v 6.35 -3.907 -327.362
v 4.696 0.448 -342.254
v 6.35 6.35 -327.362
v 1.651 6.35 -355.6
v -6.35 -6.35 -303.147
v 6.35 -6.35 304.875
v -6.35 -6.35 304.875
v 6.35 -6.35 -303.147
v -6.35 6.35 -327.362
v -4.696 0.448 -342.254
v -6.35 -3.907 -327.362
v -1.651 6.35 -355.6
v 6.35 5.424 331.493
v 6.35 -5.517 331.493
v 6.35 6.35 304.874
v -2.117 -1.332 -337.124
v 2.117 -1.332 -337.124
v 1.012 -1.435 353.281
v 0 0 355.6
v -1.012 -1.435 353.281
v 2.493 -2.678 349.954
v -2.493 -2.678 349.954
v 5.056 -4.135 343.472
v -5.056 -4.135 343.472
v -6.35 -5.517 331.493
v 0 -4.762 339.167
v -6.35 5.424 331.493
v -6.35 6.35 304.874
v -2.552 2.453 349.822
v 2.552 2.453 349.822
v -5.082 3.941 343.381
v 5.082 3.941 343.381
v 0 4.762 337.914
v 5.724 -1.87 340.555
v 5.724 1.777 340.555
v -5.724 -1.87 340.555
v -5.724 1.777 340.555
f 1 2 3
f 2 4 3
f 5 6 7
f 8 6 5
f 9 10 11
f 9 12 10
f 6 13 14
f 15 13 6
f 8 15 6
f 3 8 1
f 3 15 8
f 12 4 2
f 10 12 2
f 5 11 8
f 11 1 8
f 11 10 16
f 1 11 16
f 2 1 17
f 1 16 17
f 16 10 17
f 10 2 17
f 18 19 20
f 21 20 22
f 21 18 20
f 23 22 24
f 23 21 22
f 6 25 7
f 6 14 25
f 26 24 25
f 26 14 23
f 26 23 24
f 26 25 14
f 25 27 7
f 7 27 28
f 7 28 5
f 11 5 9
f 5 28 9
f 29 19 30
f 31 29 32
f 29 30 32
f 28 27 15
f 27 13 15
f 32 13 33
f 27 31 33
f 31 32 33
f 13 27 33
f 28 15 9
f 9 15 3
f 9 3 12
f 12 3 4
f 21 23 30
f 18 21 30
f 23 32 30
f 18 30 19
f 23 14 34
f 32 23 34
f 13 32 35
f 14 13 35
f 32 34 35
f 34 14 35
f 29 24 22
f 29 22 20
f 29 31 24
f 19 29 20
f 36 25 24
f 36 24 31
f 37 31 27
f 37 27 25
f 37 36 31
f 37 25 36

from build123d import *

# Parameters (mm, degrees)
SKETCH2_W           = 711.2
SKETCH2_H           = 12.7
BOSS_EXTRUDE2_DEPTH = 6.35
CUT_EXTRUDE1_DEPTH  = 13.7
CUT_EXTRUDE2_DEPTH  = 13.7000001
CUT_EXTRUDE3_DEPTH  = 13.7000001
CUT_EXTRUDE4_DEPTH  = 13.7000001


with BuildPart() as part:
    # Sketch2 → Boss-Extrude2 (new body, symmetric)
    with BuildSketch(Plane(origin=(0, 0, 0), x_dir=(0, 0, -1), z_dir=(1, 0, 0))):
        Rectangle(SKETCH2_W, SKETCH2_H)
    extrude(amount=BOSS_EXTRUDE2_DEPTH, both=True)

    # Sketch4 → Cut-Extrude1 (cut, through all)
    with BuildSketch(Plane(origin=(6.35, 0, 0), x_dir=(0, 0, -1), z_dir=(1, 0, 0))):
        with BuildLine():
            Line((-304.87408605, 6.35), (-304.87408605, 13.865538478))
            Line((-304.87408605, 13.865538478), (-363.512264419, 13.865538478))
            Line((-363.512264419, 13.865538478), (-363.512264419, -12.328277535))
            Line((-363.512264419, -12.328277535), (-304.874567486, -12.328277535))
            Line((-304.874567486, -12.328277535), (-304.874567486, -6.35))
            add(Edge.make_bspline(
                [(-355.6, 0), (-348.097307304, -6.35), (-304.874567486, -6.35)],
                knots=[0, 0, 0, 1, 1, 1], degree=2))
            add(Edge.make_bspline(
                [(-355.6, 0), (-345.591229217, 6.35), (-304.87408605, 6.35)],
                knots=[0, 0, 0, 1, 1, 1], degree=2))
        make_face()
    extrude(amount=-CUT_EXTRUDE1_DEPTH, mode=Mode.SUBTRACT)

    # Sketch5 → Cut-Extrude2 (cut, through all)
    with BuildSketch(Plane(origin=(0, 6.35, 0), x_dir=(1, 0, 0), z_dir=(0, 1, 0))):
        with BuildLine():
            Line((-6.35, -304.87408605), (-23.988893808, -304.87408605))
            Line((-23.988893808, -304.87408605), (-23.988893808, -362.653977565))
            Line((-23.988893808, -362.653977565), (16.903963191, -362.653977565))
            Line((16.903963191, -362.653977565), (16.903963191, -304.87408605))
            Line((16.903963191, -304.87408605), (6.35, -304.87408605))
            add(Edge.make_bspline(
                [(6.35, -304.87408605), (6.35, -345.744640536), (7.326296323, -338.596228196), (0, -355.6)],
                knots=[0, 0, 0, 0, 1, 1, 1, 1], degree=3))
            add(Edge.make_bspline(
                [(-6.35, -304.87408605), (-6.35, -345.744640536), (-7.326296323, -338.596228196), (0, -355.6)],
                knots=[0, 0, 0, 0, 1, 1, 1, 1], degree=3))
        make_face()
    extrude(amount=-CUT_EXTRUDE2_DEPTH, mode=Mode.SUBTRACT)

    # Sketch6 → Cut-Extrude3 (cut, through all)
    with BuildSketch(Plane(origin=(6.35, 0, 0), x_dir=(0, 0, -1), z_dir=(1, 0, 0))):
        with BuildLine():
            Line((286.848717456, -6.35), (286.848717456, -20.474403892))
            Line((286.848717456, -20.474403892), (367.422975775, -20.474403892))
            Line((367.422975775, -20.474403892), (367.422975775, 6.35))
            Line((367.422975775, 6.35), (355.6, 6.35))
            add(Edge.make_bspline(
                [(355.6, 6.35), (329.990285951, -6.563724339), (313.323760361, -6.629041346), (286.848717456, -6.35)],
                knots=[0, 0, 0, 0, 1, 1, 1, 1], degree=3))
        make_face()
    extrude(amount=-CUT_EXTRUDE3_DEPTH, mode=Mode.SUBTRACT)

    # Sketch7 → Cut-Extrude4 (cut, through all)
    with BuildSketch(Plane(origin=(0, 6.35, 0), x_dir=(1, 0, 0), z_dir=(0, 1, 0))):
        with BuildLine():
            Line((1.651, 355.6), (-1.651, 355.6))
            add(Edge.make_bspline(
                [(-1.651, 355.6), (-7.543065091, 333.607768993), (-6.35, 324.690959151), (-6.35, 310.113688271)],
                knots=[0, 0, 0, 0, 1, 1, 1, 1], degree=3))
            Line((-6.35, 310.113688271), (-23.620546209, 310.113688271))
            Line((-23.620546209, 310.113688271), (-23.620546209, 363.551883896))
            Line((-23.620546209, 363.551883896), (18.925820136, 363.551883896))
            Line((18.925820136, 363.551883896), (18.925820136, 310.113688271))
            Line((18.925820136, 310.113688271), (6.35, 310.113688271))
            add(Edge.make_bspline(
                [(1.651, 355.6), (7.543065091, 333.607768993), (6.35, 324.690959151), (6.35, 310.113688271)],
                knots=[0, 0, 0, 0, 1, 1, 1, 1], degree=3))
        make_face()
    extrude(amount=-CUT_EXTRUDE4_DEPTH, mode=Mode.SUBTRACT)


solid = part.part
